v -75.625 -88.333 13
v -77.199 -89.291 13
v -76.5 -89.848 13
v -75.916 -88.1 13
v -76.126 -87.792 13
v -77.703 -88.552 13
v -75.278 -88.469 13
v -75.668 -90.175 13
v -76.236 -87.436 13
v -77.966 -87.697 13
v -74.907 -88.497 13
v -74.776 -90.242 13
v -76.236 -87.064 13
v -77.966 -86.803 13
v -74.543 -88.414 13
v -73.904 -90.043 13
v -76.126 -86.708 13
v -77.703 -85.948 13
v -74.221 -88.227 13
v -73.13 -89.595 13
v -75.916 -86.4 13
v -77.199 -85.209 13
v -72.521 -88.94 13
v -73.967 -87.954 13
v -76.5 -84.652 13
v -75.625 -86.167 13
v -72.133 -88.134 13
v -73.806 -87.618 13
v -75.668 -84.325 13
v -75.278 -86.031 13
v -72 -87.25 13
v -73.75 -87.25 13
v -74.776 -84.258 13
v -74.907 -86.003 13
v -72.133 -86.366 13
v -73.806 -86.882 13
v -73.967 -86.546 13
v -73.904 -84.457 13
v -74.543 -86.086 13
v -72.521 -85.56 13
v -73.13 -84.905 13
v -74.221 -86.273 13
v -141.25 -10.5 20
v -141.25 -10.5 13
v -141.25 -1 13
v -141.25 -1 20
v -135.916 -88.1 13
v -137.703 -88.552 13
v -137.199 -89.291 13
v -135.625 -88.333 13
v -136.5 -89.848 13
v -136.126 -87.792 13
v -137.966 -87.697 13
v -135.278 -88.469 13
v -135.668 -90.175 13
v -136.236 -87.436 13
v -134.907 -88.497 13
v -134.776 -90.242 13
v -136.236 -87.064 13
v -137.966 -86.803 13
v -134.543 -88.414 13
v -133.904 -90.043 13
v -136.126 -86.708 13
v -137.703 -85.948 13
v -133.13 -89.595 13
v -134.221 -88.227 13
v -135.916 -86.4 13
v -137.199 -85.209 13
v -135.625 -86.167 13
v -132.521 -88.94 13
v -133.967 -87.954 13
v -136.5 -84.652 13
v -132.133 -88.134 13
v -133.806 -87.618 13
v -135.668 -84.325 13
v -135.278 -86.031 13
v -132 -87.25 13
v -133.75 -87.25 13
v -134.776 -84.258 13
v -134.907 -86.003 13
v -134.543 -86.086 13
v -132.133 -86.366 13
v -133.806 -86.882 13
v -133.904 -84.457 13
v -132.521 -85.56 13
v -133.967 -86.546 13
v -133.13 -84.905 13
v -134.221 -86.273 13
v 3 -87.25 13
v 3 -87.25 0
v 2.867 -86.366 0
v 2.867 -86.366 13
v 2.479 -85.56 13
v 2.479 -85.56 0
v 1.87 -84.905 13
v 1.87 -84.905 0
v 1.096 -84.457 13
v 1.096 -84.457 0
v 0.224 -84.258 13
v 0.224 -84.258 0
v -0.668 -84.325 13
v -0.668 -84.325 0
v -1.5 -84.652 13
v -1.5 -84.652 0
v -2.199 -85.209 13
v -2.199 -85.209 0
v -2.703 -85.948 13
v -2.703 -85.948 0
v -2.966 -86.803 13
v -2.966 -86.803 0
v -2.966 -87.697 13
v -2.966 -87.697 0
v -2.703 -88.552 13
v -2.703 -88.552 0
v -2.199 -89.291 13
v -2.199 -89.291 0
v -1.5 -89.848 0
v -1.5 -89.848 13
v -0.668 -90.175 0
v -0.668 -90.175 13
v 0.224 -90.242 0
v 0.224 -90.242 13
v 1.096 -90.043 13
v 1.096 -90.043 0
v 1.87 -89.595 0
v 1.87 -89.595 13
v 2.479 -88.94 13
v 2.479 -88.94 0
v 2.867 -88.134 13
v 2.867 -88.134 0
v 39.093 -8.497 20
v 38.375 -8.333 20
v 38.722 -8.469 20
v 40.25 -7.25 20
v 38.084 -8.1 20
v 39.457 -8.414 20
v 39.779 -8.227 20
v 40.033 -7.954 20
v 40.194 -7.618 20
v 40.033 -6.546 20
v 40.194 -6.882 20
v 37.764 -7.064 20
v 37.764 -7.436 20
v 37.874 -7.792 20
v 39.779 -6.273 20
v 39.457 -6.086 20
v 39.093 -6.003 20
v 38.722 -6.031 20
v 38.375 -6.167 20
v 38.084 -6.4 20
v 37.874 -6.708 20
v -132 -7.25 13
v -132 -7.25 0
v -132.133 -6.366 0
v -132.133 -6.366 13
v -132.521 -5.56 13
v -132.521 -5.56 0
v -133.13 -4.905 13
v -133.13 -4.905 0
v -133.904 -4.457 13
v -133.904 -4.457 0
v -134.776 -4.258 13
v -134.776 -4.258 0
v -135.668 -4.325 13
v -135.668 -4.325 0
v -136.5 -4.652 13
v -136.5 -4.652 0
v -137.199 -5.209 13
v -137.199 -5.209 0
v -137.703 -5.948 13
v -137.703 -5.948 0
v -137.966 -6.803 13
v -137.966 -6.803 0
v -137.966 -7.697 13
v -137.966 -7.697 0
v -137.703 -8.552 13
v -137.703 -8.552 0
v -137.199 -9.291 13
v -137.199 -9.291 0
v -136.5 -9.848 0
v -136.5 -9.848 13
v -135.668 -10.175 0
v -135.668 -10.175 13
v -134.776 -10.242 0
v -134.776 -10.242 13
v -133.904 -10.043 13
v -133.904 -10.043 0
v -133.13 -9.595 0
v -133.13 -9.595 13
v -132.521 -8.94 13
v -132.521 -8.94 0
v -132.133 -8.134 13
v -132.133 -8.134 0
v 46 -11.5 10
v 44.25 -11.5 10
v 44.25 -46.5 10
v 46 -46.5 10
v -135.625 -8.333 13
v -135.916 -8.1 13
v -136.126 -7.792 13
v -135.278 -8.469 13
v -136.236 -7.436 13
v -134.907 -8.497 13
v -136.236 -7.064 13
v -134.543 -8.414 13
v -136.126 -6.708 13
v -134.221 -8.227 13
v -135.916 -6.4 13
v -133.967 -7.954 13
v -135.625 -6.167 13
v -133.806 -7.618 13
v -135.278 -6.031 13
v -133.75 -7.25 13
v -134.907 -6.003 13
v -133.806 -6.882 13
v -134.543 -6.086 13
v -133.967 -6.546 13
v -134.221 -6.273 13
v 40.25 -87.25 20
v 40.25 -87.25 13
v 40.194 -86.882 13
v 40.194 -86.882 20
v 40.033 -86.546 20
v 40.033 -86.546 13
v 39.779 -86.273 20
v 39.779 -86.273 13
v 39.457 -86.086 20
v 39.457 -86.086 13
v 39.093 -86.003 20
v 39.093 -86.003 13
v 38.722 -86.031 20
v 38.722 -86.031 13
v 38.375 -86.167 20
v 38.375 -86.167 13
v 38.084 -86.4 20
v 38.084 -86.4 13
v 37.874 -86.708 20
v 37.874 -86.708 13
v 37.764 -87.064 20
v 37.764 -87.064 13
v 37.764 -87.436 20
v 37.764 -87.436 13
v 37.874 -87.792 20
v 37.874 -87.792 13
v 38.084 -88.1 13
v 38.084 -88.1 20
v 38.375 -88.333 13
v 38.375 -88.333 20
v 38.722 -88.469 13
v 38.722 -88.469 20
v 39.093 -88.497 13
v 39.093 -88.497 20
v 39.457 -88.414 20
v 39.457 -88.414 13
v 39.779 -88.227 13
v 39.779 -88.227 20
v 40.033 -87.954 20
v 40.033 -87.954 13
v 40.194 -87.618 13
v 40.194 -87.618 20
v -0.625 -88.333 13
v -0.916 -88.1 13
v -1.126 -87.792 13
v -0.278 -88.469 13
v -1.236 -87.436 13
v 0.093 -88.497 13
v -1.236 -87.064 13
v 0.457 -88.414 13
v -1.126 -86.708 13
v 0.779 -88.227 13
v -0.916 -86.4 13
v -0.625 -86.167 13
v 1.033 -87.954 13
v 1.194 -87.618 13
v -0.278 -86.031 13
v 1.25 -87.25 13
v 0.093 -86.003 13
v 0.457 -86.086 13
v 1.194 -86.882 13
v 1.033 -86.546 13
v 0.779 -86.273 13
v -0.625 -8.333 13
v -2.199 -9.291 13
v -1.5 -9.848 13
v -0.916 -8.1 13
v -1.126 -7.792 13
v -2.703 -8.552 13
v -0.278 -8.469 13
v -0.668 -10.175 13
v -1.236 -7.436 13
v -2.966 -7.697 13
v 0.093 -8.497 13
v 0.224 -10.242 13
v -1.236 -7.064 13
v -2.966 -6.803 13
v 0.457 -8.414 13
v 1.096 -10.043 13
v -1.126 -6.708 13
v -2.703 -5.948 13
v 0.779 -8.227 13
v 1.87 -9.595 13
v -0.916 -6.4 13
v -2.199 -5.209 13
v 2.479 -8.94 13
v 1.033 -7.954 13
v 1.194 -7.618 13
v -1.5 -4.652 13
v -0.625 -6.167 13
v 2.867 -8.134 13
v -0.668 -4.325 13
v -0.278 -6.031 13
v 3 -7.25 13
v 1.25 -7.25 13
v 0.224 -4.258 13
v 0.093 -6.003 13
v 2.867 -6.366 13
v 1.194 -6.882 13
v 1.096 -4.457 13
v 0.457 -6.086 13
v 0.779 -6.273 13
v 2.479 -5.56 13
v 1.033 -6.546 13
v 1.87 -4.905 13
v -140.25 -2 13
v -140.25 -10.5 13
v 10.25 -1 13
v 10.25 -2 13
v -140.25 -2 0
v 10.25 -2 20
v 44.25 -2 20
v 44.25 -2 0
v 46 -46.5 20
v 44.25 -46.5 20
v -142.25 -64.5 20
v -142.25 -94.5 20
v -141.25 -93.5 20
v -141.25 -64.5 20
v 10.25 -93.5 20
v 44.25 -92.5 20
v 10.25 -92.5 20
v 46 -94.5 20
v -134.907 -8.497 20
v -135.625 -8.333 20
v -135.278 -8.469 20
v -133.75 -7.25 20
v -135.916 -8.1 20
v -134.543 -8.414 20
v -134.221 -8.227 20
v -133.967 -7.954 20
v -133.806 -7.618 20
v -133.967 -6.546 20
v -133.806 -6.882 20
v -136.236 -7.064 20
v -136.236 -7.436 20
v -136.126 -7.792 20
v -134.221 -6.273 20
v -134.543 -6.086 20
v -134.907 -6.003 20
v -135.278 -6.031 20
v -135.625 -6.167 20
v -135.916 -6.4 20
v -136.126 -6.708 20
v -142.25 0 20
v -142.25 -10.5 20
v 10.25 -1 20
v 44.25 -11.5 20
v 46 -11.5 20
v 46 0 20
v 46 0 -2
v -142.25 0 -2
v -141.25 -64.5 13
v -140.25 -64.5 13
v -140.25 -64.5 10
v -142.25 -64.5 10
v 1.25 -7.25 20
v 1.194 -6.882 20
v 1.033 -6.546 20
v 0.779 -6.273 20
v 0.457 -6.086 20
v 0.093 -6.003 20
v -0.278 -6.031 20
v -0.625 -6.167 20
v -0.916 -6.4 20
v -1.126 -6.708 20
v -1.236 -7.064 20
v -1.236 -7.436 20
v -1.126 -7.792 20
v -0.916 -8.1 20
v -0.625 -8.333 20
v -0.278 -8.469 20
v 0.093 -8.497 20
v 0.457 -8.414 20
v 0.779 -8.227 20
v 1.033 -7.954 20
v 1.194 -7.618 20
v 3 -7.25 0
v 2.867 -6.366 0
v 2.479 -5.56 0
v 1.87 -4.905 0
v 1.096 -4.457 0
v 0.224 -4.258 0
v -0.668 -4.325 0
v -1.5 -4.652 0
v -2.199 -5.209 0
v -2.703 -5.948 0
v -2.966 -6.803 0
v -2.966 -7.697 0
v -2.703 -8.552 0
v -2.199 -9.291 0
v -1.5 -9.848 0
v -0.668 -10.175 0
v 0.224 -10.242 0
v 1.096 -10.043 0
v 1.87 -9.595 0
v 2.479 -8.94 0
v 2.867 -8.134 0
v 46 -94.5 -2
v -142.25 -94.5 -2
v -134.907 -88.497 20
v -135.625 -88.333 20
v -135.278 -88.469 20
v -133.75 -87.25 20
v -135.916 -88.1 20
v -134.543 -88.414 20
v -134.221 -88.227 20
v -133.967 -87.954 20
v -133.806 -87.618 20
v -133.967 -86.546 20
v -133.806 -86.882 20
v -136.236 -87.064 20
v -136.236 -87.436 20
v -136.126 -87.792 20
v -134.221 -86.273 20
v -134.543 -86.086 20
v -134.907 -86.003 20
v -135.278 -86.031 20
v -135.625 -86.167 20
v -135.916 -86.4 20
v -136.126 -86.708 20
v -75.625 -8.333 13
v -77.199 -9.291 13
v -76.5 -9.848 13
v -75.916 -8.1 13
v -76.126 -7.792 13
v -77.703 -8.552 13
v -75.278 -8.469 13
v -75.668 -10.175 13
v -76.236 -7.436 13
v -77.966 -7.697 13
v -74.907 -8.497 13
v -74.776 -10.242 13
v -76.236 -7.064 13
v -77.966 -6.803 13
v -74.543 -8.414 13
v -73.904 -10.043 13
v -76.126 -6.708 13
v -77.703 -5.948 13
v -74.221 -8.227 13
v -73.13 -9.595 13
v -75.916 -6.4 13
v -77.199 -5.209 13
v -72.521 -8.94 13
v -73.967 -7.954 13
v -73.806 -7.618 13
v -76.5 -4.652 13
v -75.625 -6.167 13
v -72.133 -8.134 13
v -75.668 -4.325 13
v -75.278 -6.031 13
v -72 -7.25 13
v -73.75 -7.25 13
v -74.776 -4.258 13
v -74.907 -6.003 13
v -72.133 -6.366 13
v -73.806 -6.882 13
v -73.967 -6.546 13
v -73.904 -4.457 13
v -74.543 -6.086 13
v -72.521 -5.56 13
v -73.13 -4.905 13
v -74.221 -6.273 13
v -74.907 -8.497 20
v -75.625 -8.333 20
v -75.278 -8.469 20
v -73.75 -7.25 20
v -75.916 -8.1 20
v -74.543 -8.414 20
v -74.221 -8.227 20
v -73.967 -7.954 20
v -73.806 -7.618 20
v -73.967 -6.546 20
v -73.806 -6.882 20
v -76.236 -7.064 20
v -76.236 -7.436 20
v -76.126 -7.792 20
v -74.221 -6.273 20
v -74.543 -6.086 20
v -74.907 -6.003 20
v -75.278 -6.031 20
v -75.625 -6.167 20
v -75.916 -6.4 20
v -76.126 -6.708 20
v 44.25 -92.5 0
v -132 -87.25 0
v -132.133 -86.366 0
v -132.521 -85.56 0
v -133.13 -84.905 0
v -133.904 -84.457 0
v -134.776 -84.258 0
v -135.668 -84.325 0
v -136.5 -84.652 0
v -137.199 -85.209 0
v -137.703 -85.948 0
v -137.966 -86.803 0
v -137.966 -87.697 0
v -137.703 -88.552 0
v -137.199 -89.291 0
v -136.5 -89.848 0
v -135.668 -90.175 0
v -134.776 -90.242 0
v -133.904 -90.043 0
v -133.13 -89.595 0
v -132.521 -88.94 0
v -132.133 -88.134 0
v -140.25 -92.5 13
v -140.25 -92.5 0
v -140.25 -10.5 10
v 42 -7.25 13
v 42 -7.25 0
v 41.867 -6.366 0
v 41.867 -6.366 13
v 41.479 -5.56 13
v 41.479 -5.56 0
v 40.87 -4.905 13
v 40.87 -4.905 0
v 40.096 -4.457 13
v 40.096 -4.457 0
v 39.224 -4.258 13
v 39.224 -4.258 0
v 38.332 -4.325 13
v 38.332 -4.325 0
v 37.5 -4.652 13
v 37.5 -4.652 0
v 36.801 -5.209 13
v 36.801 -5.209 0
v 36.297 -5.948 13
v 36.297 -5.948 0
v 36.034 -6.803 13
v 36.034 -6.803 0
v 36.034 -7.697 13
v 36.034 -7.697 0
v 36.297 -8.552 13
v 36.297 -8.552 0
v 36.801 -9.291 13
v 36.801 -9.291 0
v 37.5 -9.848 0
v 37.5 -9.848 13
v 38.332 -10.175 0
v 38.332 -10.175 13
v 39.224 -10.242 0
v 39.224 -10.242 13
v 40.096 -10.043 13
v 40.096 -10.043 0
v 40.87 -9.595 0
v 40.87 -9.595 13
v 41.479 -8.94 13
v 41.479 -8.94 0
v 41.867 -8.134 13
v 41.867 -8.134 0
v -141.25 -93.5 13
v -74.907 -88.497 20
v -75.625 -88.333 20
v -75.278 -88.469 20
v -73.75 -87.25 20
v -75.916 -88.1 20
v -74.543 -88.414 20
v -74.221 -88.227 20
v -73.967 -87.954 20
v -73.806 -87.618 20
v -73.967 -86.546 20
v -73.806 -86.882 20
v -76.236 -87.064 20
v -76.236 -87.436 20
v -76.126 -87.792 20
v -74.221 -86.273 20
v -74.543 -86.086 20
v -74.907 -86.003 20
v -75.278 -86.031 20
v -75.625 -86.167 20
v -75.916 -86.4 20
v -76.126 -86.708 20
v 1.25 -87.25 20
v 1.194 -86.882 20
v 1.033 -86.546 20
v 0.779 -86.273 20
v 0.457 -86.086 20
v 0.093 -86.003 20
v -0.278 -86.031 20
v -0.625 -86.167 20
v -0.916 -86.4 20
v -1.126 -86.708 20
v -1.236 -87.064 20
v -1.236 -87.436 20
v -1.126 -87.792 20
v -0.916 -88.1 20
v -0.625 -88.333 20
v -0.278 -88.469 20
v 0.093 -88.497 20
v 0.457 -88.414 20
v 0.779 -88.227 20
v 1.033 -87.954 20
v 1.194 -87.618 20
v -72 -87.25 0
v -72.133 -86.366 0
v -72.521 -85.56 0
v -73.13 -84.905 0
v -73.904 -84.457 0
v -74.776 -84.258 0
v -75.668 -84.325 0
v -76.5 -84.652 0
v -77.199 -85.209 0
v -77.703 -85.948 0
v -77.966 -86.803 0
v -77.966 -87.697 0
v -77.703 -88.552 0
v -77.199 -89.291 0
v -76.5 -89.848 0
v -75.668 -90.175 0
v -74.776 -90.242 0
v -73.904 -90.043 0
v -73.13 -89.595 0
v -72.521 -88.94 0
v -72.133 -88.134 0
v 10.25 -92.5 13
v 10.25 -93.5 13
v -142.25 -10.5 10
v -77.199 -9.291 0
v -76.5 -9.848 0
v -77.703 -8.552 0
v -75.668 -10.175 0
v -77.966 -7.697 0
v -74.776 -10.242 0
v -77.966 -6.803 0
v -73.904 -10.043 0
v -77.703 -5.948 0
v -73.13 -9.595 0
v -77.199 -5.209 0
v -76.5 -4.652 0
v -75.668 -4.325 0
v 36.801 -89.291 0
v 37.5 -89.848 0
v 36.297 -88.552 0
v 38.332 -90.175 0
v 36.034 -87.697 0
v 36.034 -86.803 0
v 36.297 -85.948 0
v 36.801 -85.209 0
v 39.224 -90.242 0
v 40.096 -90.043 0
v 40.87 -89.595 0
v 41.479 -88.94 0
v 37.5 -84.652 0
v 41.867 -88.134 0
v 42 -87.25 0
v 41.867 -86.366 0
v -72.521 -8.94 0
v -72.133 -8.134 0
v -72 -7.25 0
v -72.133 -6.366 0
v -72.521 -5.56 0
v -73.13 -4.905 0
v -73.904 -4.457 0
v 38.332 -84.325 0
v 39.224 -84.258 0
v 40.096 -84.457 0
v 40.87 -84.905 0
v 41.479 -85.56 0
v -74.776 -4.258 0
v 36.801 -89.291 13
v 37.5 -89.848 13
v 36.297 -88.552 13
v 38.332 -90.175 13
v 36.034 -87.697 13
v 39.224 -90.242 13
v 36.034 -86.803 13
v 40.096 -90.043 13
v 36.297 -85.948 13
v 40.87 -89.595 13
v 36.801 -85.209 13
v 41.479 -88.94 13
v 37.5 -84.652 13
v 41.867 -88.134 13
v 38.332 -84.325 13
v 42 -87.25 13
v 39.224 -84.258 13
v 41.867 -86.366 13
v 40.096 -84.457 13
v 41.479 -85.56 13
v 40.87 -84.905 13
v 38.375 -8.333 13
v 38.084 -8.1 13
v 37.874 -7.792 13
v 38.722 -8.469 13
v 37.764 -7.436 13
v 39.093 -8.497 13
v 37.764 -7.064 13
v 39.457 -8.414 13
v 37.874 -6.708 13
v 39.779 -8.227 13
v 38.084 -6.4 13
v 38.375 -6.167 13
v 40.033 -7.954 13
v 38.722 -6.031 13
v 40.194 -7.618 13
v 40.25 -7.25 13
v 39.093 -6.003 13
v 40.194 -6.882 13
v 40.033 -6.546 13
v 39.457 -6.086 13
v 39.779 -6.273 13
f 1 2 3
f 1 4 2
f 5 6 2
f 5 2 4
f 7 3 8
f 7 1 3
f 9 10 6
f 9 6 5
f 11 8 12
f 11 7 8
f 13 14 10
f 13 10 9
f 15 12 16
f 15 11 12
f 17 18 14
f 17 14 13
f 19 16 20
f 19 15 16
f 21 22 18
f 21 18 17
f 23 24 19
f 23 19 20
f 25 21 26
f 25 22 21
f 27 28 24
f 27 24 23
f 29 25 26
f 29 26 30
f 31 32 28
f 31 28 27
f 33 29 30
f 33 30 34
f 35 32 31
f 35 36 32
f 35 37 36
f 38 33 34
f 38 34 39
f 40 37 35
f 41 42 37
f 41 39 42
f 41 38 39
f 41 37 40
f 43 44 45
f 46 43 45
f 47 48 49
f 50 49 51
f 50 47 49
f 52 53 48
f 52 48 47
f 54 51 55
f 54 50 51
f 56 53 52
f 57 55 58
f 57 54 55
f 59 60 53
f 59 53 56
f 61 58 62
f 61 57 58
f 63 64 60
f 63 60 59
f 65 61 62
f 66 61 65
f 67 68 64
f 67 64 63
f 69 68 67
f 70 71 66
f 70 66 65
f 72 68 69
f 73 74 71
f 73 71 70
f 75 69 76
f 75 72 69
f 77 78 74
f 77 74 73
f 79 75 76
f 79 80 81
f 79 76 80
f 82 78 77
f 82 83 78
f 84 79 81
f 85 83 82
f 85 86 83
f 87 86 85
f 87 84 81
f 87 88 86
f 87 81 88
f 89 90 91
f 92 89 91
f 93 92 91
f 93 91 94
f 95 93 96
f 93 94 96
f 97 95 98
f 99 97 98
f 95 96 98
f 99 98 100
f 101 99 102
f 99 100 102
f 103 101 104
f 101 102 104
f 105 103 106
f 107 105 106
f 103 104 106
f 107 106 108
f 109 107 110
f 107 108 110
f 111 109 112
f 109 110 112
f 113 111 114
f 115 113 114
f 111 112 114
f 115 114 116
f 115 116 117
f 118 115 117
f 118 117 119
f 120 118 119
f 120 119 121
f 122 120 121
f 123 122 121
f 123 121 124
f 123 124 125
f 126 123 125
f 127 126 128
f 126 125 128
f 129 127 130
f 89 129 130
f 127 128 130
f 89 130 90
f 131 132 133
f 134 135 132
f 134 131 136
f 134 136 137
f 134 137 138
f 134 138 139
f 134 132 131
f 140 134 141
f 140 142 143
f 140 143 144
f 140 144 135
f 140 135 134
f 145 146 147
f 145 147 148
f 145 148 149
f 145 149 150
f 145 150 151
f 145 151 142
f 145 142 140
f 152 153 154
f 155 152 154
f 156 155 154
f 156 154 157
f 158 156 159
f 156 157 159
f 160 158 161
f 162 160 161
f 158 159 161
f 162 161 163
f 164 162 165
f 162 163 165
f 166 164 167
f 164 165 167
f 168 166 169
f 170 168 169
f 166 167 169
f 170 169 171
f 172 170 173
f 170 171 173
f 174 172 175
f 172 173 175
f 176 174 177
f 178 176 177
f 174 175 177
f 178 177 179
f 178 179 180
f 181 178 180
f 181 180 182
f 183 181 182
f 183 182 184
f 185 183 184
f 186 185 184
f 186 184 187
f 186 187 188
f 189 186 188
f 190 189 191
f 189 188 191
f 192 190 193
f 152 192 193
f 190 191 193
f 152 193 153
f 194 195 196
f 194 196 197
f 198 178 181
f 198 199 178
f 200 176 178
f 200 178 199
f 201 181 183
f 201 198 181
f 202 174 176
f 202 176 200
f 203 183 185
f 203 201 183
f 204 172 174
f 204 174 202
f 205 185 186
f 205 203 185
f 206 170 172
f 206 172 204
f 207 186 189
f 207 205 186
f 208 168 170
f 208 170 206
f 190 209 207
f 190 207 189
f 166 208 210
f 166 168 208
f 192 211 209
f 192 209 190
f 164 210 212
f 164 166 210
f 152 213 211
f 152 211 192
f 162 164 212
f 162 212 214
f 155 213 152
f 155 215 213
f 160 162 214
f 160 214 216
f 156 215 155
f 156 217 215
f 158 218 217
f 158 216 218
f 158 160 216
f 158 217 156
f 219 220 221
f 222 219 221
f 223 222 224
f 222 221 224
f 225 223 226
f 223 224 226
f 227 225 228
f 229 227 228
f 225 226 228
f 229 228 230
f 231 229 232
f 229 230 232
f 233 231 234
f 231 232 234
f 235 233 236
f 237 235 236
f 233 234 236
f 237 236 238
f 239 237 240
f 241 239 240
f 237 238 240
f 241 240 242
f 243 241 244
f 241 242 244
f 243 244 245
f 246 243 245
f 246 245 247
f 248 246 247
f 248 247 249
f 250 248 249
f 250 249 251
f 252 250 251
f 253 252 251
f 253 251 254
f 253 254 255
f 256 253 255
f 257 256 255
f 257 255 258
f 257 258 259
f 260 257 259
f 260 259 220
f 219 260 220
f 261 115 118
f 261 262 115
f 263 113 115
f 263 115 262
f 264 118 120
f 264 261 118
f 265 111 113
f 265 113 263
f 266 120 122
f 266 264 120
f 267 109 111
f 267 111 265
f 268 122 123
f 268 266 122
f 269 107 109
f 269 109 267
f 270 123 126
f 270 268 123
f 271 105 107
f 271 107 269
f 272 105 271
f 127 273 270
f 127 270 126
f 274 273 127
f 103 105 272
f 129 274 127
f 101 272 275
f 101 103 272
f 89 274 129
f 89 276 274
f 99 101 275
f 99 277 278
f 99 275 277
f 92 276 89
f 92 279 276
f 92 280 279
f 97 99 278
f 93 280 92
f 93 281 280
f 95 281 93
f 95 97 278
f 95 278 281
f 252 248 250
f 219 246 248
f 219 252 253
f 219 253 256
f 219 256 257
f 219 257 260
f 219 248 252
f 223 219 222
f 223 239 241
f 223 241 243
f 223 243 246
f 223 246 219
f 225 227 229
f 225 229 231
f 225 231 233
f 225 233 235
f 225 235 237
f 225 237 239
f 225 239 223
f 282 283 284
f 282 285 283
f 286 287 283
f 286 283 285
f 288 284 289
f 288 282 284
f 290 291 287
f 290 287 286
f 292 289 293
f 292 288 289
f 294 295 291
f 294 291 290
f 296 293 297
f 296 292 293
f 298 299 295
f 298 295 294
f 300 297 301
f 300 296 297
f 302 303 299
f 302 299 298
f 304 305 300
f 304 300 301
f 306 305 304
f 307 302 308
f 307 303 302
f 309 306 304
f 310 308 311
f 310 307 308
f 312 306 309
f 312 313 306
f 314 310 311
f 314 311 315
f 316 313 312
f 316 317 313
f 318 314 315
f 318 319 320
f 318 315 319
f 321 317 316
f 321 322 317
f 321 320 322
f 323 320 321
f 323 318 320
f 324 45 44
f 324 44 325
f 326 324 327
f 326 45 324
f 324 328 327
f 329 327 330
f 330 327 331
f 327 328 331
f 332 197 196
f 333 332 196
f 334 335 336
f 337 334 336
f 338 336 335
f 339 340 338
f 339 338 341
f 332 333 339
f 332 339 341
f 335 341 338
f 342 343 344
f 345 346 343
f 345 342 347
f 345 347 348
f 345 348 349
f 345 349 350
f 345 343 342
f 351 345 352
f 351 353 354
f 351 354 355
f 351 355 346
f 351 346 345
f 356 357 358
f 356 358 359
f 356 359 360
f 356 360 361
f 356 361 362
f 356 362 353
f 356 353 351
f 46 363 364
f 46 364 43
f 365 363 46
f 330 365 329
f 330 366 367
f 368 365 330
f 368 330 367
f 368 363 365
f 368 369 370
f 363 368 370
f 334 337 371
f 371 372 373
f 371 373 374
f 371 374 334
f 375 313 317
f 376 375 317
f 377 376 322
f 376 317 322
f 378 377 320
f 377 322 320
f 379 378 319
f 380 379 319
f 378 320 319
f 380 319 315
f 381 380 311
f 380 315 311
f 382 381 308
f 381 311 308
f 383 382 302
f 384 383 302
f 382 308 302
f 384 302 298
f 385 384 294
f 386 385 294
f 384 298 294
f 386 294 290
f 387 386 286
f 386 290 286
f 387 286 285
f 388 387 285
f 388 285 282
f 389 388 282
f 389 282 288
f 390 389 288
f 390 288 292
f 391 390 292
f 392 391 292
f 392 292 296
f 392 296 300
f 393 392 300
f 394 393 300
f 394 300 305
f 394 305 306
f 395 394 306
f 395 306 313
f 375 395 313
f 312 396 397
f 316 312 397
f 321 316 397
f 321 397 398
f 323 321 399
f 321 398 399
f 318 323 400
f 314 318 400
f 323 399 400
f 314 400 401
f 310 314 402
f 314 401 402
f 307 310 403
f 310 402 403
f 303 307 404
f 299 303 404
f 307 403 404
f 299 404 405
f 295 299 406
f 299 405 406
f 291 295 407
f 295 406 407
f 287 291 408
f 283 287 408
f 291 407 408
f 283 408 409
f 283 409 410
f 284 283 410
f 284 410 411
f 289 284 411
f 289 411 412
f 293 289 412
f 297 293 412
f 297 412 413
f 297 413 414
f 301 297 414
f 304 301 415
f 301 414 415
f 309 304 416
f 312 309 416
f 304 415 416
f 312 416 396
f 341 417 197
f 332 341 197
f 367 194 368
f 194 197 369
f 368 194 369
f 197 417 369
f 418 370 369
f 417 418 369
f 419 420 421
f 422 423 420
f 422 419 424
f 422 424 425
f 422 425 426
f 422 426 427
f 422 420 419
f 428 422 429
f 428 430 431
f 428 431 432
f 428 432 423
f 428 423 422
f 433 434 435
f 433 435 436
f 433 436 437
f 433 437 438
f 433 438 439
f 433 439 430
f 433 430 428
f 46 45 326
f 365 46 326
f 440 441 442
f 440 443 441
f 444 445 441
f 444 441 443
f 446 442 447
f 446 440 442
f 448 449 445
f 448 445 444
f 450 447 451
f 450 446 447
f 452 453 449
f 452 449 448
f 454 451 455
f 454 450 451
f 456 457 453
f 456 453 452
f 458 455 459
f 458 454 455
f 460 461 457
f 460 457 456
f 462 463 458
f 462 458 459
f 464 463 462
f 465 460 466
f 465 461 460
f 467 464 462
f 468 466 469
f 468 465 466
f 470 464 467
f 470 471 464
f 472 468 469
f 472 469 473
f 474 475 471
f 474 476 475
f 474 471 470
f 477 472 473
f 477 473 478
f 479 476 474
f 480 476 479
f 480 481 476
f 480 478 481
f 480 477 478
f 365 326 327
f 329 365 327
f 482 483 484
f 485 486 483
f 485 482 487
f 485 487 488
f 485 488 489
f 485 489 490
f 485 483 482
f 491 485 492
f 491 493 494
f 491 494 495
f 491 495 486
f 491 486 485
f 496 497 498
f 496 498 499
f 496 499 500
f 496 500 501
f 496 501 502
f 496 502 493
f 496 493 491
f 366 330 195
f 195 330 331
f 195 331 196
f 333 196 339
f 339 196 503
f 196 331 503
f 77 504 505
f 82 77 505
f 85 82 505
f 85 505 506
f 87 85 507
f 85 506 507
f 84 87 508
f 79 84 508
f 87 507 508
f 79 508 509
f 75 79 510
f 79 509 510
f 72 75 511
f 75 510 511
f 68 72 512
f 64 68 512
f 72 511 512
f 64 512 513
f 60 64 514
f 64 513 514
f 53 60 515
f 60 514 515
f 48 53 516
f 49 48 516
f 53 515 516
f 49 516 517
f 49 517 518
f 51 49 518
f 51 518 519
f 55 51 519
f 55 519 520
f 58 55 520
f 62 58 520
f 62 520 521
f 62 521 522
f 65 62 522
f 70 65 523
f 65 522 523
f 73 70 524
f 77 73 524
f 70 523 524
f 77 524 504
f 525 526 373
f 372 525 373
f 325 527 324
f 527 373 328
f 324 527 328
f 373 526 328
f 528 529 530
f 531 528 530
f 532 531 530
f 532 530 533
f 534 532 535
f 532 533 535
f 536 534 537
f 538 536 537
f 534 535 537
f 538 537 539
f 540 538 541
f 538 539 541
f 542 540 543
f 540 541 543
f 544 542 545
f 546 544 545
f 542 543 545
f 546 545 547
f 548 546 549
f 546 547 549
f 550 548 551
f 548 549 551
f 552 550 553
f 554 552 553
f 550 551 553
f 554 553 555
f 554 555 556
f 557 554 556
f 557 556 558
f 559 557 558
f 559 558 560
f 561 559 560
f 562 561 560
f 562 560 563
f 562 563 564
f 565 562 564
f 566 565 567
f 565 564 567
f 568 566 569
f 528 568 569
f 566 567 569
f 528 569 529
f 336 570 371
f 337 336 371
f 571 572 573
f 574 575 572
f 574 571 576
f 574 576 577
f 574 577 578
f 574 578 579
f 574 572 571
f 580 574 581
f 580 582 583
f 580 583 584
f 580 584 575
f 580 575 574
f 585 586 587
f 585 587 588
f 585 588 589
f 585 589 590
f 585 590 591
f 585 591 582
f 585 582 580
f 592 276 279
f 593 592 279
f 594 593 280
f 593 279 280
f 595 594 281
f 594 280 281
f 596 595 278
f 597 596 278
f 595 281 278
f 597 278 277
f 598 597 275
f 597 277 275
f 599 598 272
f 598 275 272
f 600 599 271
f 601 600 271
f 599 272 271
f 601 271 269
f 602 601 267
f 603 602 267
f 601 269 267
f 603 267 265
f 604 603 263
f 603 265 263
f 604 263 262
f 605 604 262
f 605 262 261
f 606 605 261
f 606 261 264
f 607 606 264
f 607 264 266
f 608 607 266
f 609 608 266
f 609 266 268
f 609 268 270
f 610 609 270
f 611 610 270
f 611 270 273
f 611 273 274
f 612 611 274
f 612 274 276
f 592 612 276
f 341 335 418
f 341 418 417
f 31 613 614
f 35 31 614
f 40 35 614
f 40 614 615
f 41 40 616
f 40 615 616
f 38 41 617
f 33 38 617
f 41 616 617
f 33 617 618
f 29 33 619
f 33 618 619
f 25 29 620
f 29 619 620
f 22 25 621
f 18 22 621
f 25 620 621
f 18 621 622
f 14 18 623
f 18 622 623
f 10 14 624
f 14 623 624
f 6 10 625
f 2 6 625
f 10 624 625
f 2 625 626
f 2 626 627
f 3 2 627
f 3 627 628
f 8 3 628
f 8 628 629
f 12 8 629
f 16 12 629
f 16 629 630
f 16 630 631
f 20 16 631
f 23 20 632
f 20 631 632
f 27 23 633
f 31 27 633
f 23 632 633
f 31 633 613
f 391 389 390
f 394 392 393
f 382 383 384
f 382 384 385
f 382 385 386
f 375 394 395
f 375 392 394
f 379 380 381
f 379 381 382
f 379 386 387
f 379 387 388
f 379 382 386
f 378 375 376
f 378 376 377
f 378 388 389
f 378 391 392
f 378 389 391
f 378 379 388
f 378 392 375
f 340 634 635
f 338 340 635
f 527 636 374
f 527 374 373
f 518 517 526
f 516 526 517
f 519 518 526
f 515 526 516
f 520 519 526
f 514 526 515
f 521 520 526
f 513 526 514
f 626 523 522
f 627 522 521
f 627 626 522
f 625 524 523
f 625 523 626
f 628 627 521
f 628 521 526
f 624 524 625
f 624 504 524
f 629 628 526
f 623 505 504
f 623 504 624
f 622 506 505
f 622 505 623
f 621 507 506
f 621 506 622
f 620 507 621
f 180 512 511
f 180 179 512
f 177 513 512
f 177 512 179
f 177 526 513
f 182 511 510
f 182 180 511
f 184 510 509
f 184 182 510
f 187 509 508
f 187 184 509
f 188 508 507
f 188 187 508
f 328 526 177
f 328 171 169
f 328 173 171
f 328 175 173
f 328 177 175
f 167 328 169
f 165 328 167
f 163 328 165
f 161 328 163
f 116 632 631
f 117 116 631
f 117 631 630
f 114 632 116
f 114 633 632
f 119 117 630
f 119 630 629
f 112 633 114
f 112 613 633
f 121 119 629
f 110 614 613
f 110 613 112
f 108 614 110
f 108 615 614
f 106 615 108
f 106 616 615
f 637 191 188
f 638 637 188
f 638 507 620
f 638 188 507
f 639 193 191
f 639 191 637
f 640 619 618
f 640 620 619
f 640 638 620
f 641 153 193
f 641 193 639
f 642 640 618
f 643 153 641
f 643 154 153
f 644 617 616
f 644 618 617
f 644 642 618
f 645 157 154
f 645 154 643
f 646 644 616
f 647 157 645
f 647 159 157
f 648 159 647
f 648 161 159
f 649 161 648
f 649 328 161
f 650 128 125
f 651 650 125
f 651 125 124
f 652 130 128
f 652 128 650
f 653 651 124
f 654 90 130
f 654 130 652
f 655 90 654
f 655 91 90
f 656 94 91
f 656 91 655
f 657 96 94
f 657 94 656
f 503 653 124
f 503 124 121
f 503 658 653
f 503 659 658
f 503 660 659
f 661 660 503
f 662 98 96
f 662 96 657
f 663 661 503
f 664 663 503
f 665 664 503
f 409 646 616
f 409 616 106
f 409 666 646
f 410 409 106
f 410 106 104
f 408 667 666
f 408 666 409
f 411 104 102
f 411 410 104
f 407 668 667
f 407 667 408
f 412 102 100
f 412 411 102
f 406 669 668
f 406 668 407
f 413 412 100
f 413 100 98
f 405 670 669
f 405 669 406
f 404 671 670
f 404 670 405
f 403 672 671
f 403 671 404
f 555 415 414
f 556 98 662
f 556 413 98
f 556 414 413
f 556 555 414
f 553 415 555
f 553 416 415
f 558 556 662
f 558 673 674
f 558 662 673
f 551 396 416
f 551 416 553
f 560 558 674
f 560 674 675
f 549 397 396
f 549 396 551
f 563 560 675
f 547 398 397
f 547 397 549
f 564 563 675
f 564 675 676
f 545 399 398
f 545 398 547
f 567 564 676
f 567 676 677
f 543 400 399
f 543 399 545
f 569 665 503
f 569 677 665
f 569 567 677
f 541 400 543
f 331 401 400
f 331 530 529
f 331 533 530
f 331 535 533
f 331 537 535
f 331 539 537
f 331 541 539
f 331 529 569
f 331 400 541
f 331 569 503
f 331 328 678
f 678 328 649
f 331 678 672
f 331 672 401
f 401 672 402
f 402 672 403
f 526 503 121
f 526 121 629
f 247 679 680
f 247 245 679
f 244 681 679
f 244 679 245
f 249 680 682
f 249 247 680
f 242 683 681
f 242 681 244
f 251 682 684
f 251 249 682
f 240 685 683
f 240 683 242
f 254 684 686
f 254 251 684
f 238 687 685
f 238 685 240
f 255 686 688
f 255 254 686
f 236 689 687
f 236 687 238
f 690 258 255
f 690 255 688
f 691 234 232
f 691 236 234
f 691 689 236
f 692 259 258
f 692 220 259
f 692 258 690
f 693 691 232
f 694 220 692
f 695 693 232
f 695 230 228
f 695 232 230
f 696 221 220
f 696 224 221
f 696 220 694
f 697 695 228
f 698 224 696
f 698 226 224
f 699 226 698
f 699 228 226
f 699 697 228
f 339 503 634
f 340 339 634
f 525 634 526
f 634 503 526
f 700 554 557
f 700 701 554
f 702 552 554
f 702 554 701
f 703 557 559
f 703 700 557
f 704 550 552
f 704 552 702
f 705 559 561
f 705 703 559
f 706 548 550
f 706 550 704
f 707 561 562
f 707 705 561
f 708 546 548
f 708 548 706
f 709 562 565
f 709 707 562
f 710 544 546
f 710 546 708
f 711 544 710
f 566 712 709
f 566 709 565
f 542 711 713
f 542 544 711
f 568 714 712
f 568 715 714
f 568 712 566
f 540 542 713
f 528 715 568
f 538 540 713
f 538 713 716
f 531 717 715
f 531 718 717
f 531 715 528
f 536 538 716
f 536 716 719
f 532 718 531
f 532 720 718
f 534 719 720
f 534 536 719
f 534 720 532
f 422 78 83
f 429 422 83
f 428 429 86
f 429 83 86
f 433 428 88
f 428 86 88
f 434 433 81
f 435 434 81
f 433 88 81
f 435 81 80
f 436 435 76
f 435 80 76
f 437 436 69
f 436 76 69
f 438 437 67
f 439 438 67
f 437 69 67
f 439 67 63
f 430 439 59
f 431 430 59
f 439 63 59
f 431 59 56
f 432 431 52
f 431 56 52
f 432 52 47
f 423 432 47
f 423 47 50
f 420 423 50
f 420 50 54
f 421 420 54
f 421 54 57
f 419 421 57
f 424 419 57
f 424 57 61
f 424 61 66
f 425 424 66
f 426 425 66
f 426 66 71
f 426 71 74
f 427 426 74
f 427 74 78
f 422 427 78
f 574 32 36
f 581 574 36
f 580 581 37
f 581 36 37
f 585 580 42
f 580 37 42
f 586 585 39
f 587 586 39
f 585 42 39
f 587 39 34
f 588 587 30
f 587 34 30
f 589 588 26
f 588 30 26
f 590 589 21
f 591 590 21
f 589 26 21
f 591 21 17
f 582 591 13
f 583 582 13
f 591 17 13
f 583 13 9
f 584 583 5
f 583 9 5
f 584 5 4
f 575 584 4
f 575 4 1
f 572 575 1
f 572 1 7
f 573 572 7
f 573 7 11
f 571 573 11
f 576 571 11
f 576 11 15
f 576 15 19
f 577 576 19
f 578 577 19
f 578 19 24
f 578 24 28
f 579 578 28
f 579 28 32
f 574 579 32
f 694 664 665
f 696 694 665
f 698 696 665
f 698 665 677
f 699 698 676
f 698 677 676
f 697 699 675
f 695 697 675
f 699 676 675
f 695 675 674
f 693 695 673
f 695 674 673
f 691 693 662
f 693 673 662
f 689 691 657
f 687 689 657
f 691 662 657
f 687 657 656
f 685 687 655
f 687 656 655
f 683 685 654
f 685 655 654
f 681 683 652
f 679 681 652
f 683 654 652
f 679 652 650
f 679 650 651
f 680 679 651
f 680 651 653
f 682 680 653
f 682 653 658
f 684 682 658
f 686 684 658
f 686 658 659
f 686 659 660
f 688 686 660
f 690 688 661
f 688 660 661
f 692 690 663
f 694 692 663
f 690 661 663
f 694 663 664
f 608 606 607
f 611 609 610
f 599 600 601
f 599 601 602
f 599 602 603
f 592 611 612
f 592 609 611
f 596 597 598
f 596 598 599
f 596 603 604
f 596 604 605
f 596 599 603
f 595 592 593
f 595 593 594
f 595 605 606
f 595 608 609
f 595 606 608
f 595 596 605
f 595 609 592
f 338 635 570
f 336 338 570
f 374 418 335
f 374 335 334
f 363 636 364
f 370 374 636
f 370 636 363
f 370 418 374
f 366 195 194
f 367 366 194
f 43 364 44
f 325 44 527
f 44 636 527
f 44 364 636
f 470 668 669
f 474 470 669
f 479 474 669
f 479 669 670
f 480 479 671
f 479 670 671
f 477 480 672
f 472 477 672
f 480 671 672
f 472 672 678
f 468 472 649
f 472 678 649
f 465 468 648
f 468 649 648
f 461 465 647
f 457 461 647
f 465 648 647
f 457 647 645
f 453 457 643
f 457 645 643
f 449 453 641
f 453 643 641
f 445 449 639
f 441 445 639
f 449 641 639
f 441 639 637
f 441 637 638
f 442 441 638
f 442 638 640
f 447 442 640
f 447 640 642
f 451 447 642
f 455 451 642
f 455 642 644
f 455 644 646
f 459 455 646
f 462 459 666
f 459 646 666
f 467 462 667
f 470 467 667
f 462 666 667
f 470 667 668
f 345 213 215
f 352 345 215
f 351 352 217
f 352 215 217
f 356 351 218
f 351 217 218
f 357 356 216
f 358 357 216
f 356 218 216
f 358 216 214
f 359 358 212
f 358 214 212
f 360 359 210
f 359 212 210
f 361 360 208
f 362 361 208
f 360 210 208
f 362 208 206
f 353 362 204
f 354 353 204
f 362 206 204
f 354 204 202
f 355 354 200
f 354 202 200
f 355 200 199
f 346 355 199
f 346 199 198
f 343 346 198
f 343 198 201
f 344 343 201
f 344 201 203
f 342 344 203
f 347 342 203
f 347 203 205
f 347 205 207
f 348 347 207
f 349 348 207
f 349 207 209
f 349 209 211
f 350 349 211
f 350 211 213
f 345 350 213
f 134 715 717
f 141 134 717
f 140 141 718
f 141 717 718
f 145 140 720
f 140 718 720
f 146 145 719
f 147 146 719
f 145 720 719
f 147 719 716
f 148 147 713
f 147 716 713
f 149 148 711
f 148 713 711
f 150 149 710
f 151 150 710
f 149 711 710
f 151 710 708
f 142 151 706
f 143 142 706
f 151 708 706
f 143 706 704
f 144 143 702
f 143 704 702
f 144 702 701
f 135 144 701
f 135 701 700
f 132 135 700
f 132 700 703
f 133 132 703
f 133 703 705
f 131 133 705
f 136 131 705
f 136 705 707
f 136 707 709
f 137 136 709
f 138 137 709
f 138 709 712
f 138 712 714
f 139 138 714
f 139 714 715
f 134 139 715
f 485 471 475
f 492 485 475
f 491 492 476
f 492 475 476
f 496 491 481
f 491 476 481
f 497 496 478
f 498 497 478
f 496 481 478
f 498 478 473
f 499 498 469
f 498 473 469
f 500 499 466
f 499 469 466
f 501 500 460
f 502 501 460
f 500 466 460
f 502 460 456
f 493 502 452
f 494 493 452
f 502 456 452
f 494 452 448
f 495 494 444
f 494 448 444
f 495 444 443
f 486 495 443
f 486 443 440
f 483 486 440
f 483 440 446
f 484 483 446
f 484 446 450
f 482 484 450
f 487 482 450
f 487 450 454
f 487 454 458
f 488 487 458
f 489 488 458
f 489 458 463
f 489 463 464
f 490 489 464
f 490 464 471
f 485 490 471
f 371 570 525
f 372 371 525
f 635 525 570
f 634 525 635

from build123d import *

# Parameters (mm, degrees)
F0_W     = 1
F0_H     = 54
F0_W_2   = 1.75
F0_H_2   = 35
F0_R     = 3
F0_R_2   = 1.25
F1_DEPTH = 2
F2_DEPTH = 20
F3_DEPTH = 13
F4_DEPTH = 10
F5_DEPTH = 20
F6_DEPTH = 13


# Not quite as in the source:
# - a feature names something its author has since deleted; it is built from what else it names


with BuildPart() as f1:
    # F0 (on Top) → F1 (new body)
    with BuildSketch(Plane.XY):
        Polygon((10.25, 0), (-142.25, 0), (-142.25, -10.5), (-141.25, -10.5), (-141.25, -1), (10.25, -1), align=None)
        Polygon((46, 0), (10.25, 0), (10.25, -1), (10.25, -2), (44.25, -2), (44.25, -11.5), (46, -11.5), align=None)
        with Locations((-141.75, -37.5)):
            Rectangle(F0_W, F0_H)
        Polygon((10.25, -2), (10.25, -1), (-141.25, -1), (-141.25, -10.5), (-140.25, -10.5), (-140.25, -2), align=None)
        Polygon((-141.25, -64.5), (-142.25, -64.5), (-142.25, -94.5), (10.25, -94.5), (10.25, -93.5), (-141.25, -93.5), align=None)
        with Locations((-140.75, -37.5)):
            Rectangle(F0_W, F0_H)
        with Locations((45.125, -29)):
            Rectangle(F0_W_2, F0_H_2)
        Polygon((44.25, -2), (10.25, -2), (-140.25, -2), (-140.25, -10.5), (-140.25, -64.5), (-140.25, -92.5), (10.25, -92.5), (44.25, -92.5), (44.25, -46.5), (44.25, -11.5), align=None)
        with Locations((-135, -87.25)):
            Circle(F0_R, mode=Mode.SUBTRACT)
        with Locations((-75, -87.25)):
            Circle(F0_R, mode=Mode.SUBTRACT)
        with Locations((0, -87.25)):
            Circle(F0_R, mode=Mode.SUBTRACT)
        with Locations((39, -87.25)):
            Circle(F0_R, mode=Mode.SUBTRACT)
        with Locations((-135, -7.25)):
            Circle(F0_R, mode=Mode.SUBTRACT)
        with Locations((-75, -7.25)):
            Circle(F0_R, mode=Mode.SUBTRACT)
        with Locations((0, -7.25)):
            Circle(F0_R, mode=Mode.SUBTRACT)
        with Locations((39, -7.25)):
            Circle(F0_R, mode=Mode.SUBTRACT)
        Polygon((-140.25, -64.5), (-141.25, -64.5), (-141.25, -93.5), (10.25, -93.5), (10.25, -92.5), (-140.25, -92.5), align=None)
        Polygon((46, -94.5), (46, -46.5), (44.25, -46.5), (44.25, -92.5), (10.25, -92.5), (10.25, -93.5), (10.25, -94.5), align=None)
        with Locations((-135, -87.25)):
            Circle(F0_R)
        with Locations((-135, -87.25)):
            Circle(F0_R_2, mode=Mode.SUBTRACT)
        with Locations((-135, -7.25)):
            Circle(F0_R)
        with Locations((-135, -7.25)):
            Circle(F0_R_2, mode=Mode.SUBTRACT)
        with Locations((-75, -87.25)):
            Circle(F0_R)
        with Locations((-75, -87.25)):
            Circle(F0_R_2, mode=Mode.SUBTRACT)
        with Locations((-75, -7.25)):
            Circle(F0_R)
        with Locations((-75, -7.25)):
            Circle(F0_R_2, mode=Mode.SUBTRACT)
        with Locations((0, -7.25)):
            Circle(F0_R)
        with Locations((0, -7.25)):
            Circle(F0_R_2, mode=Mode.SUBTRACT)
        with Locations((0, -87.25)):
            Circle(F0_R)
        with Locations((0, -87.25)):
            Circle(F0_R_2, mode=Mode.SUBTRACT)
        with Locations((39, -87.25)):
            Circle(F0_R)
        with Locations((39, -87.25)):
            Circle(F0_R_2, mode=Mode.SUBTRACT)
        with Locations((39, -7.25)):
            Circle(F0_R)
        with Locations((39, -7.25)):
            Circle(F0_R_2, mode=Mode.SUBTRACT)
        with Locations((-135, -87.25)):
            Circle(F0_R_2)
        with Locations((-75, -87.25)):
            Circle(F0_R_2)
        with Locations((0, -87.25)):
            Circle(F0_R_2)
        with Locations((39, -87.25)):
            Circle(F0_R_2)
        with Locations((-135, -7.25)):
            Circle(F0_R_2)
        with Locations((-75, -7.25)):
            Circle(F0_R_2)
        with Locations((0, -7.25)):
            Circle(F0_R_2)
        with Locations((39, -7.25)):
            Circle(F0_R_2)
    extrude(amount=-F1_DEPTH)

    # F0 (on Top) → F2 (join)
    with BuildSketch(Plane.XY):
        Polygon((10.25, 0), (-142.25, 0), (-142.25, -10.5), (-141.25, -10.5), (-141.25, -1), (10.25, -1), align=None)
        Polygon((46, 0), (10.25, 0), (10.25, -1), (10.25, -2), (44.25, -2), (44.25, -11.5), (46, -11.5), align=None)
        Polygon((46, -94.5), (46, -46.5), (44.25, -46.5), (44.25, -92.5), (10.25, -92.5), (10.25, -93.5), (10.25, -94.5), align=None)
        Polygon((-141.25, -64.5), (-142.25, -64.5), (-142.25, -94.5), (10.25, -94.5), (10.25, -93.5), (-141.25, -93.5), align=None)
    extrude(amount=F2_DEPTH)

    # F0 (on Top) → F3 (join)
    with BuildSketch(Plane.XY):
        Polygon((10.25, -2), (10.25, -1), (-141.25, -1), (-141.25, -10.5), (-140.25, -10.5), (-140.25, -2), align=None)
        Polygon((-140.25, -64.5), (-141.25, -64.5), (-141.25, -93.5), (10.25, -93.5), (10.25, -92.5), (-140.25, -92.5), align=None)
    extrude(amount=F3_DEPTH)

    # F0 (on Top) → F4 (join)
    with BuildSketch(Plane.XY):
        with Locations((-140.75, -37.5)):
            Rectangle(F0_W, F0_H)
        with Locations((-141.75, -37.5)):
            Rectangle(F0_W, F0_H)
        with Locations((45.125, -29)):
            Rectangle(F0_W_2, F0_H_2)
    extrude(amount=F4_DEPTH)

    # F0 (on Top) → F5 (join)
    with BuildSketch(Plane.XY):
        with Locations((-135, -7.25)):
            Circle(F0_R_2)
        with Locations((-75, -7.25)):
            Circle(F0_R_2)
        with Locations((0, -7.25)):
            Circle(F0_R_2)
        with Locations((39, -7.25)):
            Circle(F0_R_2)
        with Locations((39, -87.25)):
            Circle(F0_R_2)
        with Locations((0, -87.25)):
            Circle(F0_R_2)
        with Locations((-75, -87.25)):
            Circle(F0_R_2)
        with Locations((-135, -87.25)):
            Circle(F0_R_2)
    extrude(amount=F5_DEPTH)

    # F0 (on Top) → F6 (join)
    with BuildSketch(Plane.XY):
        with Locations((-135, -7.25)):
            Circle(F0_R)
        with Locations((-135, -7.25)):
            Circle(F0_R_2, mode=Mode.SUBTRACT)
        with Locations((-75, -7.25)):
            Circle(F0_R)
        with Locations((-75, -7.25)):
            Circle(F0_R_2, mode=Mode.SUBTRACT)
        with Locations((0, -7.25)):
            Circle(F0_R)
        with Locations((0, -7.25)):
            Circle(F0_R_2, mode=Mode.SUBTRACT)
        with Locations((39, -7.25)):
            Circle(F0_R)
        with Locations((39, -7.25)):
            Circle(F0_R_2, mode=Mode.SUBTRACT)
        with Locations((-135, -87.25)):
            Circle(F0_R)
        with Locations((-135, -87.25)):
            Circle(F0_R_2, mode=Mode.SUBTRACT)
        with Locations((-75, -87.25)):
            Circle(F0_R)
        with Locations((-75, -87.25)):
            Circle(F0_R_2, mode=Mode.SUBTRACT)
        with Locations((0, -87.25)):
            Circle(F0_R)
        with Locations((0, -87.25)):
            Circle(F0_R_2, mode=Mode.SUBTRACT)
        with Locations((39, -87.25)):
            Circle(F0_R)
        with Locations((39, -87.25)):
            Circle(F0_R_2, mode=Mode.SUBTRACT)
    extrude(amount=F6_DEPTH)


solid = f1.part
